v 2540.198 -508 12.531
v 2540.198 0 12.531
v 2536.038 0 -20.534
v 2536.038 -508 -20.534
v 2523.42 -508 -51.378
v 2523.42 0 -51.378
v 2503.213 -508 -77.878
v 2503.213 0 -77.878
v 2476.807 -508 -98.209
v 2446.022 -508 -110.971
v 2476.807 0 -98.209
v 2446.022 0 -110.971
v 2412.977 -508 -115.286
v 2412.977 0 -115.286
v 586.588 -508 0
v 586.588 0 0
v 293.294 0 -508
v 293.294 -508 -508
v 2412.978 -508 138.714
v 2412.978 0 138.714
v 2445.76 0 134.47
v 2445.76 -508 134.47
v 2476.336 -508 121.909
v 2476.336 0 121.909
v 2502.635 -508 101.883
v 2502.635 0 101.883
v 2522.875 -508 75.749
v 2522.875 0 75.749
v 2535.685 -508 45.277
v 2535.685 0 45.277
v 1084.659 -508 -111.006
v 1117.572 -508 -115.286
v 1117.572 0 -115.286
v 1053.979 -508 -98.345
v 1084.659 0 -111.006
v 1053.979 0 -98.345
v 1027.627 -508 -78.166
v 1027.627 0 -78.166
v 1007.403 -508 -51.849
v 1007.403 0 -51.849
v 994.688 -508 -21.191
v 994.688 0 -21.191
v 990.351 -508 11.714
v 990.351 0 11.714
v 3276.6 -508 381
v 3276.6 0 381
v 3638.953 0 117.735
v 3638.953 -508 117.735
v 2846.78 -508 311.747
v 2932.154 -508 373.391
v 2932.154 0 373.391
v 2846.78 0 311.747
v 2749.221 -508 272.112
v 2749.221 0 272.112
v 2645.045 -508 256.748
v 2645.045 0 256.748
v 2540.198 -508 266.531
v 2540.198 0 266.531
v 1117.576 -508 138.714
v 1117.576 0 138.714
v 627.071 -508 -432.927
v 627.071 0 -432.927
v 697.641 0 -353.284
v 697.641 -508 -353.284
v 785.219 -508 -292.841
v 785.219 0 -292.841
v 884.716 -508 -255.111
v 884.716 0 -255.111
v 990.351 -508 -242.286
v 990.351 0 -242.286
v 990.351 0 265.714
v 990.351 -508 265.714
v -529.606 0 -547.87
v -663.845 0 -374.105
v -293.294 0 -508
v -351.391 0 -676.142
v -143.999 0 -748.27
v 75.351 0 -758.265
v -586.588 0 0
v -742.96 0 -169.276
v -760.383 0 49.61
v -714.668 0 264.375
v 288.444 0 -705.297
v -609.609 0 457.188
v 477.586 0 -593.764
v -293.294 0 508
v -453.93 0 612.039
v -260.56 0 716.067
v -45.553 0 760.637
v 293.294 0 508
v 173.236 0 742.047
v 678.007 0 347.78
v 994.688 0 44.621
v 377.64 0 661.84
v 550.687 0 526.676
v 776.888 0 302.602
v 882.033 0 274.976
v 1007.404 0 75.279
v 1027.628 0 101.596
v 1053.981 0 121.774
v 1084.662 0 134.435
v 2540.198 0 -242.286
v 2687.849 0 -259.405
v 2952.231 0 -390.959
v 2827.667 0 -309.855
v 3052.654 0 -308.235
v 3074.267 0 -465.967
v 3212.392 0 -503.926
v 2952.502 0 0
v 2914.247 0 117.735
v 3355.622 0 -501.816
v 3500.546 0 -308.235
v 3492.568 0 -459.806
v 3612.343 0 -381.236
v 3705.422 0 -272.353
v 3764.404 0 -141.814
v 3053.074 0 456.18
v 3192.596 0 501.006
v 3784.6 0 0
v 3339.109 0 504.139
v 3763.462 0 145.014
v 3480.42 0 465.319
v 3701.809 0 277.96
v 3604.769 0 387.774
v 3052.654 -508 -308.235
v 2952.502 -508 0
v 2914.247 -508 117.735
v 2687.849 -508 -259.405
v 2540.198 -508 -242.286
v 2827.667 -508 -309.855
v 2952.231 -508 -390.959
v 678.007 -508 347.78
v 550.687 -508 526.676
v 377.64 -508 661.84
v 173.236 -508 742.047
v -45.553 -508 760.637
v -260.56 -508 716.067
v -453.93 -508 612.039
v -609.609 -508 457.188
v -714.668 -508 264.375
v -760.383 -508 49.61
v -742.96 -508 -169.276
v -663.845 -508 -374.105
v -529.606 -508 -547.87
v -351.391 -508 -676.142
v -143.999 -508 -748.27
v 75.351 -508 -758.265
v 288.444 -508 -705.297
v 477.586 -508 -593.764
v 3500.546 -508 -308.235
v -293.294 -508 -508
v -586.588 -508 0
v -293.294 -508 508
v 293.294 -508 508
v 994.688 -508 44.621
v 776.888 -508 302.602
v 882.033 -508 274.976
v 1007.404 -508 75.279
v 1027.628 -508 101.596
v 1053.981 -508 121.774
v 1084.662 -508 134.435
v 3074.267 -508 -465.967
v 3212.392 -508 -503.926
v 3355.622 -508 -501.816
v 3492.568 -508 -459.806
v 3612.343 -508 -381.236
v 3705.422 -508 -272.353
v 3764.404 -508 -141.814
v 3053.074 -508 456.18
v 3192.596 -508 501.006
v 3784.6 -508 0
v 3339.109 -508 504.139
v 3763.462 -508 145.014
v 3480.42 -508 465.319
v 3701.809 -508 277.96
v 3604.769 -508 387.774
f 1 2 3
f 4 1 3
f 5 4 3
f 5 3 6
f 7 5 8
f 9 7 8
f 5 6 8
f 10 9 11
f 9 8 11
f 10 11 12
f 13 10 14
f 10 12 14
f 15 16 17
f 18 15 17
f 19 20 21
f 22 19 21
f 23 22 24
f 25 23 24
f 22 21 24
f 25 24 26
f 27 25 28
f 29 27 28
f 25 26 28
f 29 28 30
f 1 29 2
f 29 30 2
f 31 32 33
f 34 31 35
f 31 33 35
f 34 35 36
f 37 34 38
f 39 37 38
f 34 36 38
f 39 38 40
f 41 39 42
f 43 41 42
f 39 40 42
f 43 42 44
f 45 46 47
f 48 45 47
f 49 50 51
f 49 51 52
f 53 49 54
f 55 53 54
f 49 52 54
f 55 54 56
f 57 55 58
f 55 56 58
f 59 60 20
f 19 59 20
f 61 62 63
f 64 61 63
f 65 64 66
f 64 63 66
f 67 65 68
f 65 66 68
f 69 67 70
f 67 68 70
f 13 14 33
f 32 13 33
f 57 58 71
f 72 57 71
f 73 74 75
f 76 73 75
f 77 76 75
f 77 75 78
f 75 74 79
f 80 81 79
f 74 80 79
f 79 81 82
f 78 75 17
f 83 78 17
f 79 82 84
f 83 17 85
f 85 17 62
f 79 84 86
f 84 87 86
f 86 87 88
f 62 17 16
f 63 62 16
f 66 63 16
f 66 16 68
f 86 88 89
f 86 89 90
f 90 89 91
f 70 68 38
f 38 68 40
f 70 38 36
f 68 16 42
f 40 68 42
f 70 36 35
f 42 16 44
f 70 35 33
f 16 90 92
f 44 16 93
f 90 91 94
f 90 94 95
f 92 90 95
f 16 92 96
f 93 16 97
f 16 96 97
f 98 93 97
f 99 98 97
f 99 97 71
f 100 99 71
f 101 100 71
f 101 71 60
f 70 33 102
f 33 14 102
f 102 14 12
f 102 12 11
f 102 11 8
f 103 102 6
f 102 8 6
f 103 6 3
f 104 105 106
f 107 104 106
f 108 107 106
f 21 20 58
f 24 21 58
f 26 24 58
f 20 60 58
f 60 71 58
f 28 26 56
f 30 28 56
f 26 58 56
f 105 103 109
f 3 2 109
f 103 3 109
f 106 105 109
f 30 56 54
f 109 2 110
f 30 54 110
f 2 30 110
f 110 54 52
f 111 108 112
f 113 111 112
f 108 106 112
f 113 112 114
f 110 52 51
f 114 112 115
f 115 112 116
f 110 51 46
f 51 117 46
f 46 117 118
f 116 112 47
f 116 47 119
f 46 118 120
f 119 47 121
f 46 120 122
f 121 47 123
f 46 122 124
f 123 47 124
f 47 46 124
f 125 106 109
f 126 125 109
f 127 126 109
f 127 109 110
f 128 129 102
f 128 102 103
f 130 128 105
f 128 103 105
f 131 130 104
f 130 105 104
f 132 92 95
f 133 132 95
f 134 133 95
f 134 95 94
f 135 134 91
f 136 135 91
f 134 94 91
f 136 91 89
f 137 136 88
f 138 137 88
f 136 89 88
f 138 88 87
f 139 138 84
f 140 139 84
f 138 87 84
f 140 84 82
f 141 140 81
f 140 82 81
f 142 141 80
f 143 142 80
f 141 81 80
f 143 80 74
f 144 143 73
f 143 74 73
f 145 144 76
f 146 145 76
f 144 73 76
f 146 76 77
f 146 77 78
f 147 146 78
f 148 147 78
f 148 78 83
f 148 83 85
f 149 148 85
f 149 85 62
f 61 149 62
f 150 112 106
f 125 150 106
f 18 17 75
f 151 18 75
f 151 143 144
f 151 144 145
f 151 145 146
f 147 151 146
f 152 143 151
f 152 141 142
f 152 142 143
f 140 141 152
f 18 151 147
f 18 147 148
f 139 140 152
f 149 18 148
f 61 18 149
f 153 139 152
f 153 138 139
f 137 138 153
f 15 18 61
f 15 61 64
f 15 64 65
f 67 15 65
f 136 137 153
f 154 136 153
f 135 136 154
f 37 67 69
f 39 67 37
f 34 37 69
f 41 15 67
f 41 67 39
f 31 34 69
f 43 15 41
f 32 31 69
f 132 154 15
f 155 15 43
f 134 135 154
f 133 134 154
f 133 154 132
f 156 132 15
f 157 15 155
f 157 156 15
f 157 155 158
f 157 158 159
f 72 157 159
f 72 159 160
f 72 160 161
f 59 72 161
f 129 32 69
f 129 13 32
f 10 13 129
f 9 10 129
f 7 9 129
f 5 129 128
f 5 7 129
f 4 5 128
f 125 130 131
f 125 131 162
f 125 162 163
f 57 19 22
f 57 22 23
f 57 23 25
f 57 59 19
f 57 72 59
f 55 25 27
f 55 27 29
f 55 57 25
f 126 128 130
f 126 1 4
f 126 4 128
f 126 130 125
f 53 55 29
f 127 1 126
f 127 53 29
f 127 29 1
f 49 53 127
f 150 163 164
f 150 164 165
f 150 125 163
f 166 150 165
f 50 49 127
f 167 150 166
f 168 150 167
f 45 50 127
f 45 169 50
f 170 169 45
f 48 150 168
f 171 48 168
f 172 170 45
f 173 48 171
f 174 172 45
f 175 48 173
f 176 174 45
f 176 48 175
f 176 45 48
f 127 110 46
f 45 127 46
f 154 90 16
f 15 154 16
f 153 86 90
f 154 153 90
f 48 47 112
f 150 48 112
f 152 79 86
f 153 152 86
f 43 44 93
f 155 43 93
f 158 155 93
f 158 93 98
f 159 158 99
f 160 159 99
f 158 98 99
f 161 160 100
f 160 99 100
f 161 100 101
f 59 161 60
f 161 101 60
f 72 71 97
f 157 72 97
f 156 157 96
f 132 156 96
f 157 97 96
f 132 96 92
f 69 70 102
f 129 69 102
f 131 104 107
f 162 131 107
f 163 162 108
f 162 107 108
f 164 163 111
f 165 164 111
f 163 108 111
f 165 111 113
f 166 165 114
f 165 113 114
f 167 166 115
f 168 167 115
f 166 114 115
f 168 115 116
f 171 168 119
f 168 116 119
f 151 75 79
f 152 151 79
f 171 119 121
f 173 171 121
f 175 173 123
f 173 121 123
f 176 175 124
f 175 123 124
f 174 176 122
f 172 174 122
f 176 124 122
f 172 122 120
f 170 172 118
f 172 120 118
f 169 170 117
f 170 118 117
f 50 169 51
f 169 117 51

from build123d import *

# Parameters (mm, degrees)
F1_DEPTH = 508


with BuildPart() as f1:
    # F0 (on Front) → F1 (new body)
    with BuildSketch(Plane.XZ):
        with BuildLine():
            ThreePointArc((627.071148, -432.926986), (727.486156, -226.733087), (762, 0))
            ThreePointArc((762, 0), (740.70408, 178.889536), (678.006651, 347.780077))
            ThreePointArc((678.006651, 347.780077), (-760.383387, 49.60953), (627.071148, -432.926986))
        make_face()
        Polygon((-586.587873, 0), (-293.293937, 508), (293.293937, 508), (586.587873, 0), (293.293937, -508), (-293.293937, -508), align=None, mode=Mode.SUBTRACT)
        with BuildLine():
            Line((990.35124, 11.714339), (990.35124, -242.285661))
            Line((990.35124, -242.285661), (2540.197712, -242.285661))
            ThreePointArc((2540.197712, -242.285661), (2759.215373, -280.590817), (2952.230834, -390.958622))
            ThreePointArc((2952.230834, -390.958622), (2813.860961, -209.610548), (2768.792984, 14.001221))
            Line((2768.792984, 14.001221), (2540.197712, 12.530956))
            ThreePointArc((2540.197712, 12.530956), (2503.212536, -77.878292), (2412.977153, -115.285661))
            Line((2412.977153, -115.285661), (1117.572118, -115.285661))
            ThreePointArc((1117.572118, -115.285661), (1027.626737, -78.166405), (990.35124, 11.714339))
        make_face()
        with BuildLine():
            Line((2540.197712, 266.530956), (990.35124, 265.714339))
            Line((990.35124, 265.714339), (990.35124, 11.714339))
            ThreePointArc((990.35124, 11.714339), (1027.628253, 101.596212), (1117.576018, 138.713948))
            Line((1117.576018, 138.713948), (2412.977851, 138.713948))
            ThreePointArc((2412.977851, 138.713948), (2502.634698, 101.883402), (2540.197712, 12.530956))
            Line((2540.197712, 12.530956), (2540.197712, 266.530956))
        make_face()
        with BuildLine():
            ThreePointArc((678.006651, 347.780077), (740.70408, 178.889536), (762, 0))
            ThreePointArc((762, 0), (727.486156, -226.733087), (627.071148, -432.926986))
            ThreePointArc((627.071148, -432.926986), (785.219246, -292.840809), (990.35124, -242.285661))
            Line((990.35124, -242.285661), (990.35124, 11.714339))
            Line((990.35124, 11.714339), (990.35124, 265.714339))
            ThreePointArc((990.35124, 265.714339), (828.867397, 286.5313), (678.006651, 347.780077))
        make_face()
        with BuildLine():
            ThreePointArc((2932.153652, 373.390832), (2749.220714, 272.112458), (2540.197712, 266.530956))
            Line((2540.197712, 266.530956), (2540.197712, 12.530956))
            Line((2540.197712, 12.530956), (2768.792984, 14.001221))
            ThreePointArc((2768.792984, 14.001221), (2814.13468, 210.213767), (2932.153652, 373.390832))
        make_face()
        with BuildLine():
            ThreePointArc((3784.6, 0), (3480.420086, 465.318571), (2932.153652, 373.390832))
            ThreePointArc((2932.153652, 373.390832), (2814.13468, 210.213767), (2768.792984, 14.001221))
            ThreePointArc((2768.792984, 14.001221), (2813.860961, -209.610548), (2952.230834, -390.958622))
            ThreePointArc((2952.230834, -390.958622), (3492.568127, -459.806229), (3784.6, 0))
        make_face()
        Polygon((3638.952533, 117.735475), (3500.546181, -308.235475), (3052.653819, -308.235475), (2952.502042, 0), (2914.247467, 117.735475), (3276.6, 381), align=None, mode=Mode.SUBTRACT)
    extrude(amount=F1_DEPTH)


solid = f1.part
